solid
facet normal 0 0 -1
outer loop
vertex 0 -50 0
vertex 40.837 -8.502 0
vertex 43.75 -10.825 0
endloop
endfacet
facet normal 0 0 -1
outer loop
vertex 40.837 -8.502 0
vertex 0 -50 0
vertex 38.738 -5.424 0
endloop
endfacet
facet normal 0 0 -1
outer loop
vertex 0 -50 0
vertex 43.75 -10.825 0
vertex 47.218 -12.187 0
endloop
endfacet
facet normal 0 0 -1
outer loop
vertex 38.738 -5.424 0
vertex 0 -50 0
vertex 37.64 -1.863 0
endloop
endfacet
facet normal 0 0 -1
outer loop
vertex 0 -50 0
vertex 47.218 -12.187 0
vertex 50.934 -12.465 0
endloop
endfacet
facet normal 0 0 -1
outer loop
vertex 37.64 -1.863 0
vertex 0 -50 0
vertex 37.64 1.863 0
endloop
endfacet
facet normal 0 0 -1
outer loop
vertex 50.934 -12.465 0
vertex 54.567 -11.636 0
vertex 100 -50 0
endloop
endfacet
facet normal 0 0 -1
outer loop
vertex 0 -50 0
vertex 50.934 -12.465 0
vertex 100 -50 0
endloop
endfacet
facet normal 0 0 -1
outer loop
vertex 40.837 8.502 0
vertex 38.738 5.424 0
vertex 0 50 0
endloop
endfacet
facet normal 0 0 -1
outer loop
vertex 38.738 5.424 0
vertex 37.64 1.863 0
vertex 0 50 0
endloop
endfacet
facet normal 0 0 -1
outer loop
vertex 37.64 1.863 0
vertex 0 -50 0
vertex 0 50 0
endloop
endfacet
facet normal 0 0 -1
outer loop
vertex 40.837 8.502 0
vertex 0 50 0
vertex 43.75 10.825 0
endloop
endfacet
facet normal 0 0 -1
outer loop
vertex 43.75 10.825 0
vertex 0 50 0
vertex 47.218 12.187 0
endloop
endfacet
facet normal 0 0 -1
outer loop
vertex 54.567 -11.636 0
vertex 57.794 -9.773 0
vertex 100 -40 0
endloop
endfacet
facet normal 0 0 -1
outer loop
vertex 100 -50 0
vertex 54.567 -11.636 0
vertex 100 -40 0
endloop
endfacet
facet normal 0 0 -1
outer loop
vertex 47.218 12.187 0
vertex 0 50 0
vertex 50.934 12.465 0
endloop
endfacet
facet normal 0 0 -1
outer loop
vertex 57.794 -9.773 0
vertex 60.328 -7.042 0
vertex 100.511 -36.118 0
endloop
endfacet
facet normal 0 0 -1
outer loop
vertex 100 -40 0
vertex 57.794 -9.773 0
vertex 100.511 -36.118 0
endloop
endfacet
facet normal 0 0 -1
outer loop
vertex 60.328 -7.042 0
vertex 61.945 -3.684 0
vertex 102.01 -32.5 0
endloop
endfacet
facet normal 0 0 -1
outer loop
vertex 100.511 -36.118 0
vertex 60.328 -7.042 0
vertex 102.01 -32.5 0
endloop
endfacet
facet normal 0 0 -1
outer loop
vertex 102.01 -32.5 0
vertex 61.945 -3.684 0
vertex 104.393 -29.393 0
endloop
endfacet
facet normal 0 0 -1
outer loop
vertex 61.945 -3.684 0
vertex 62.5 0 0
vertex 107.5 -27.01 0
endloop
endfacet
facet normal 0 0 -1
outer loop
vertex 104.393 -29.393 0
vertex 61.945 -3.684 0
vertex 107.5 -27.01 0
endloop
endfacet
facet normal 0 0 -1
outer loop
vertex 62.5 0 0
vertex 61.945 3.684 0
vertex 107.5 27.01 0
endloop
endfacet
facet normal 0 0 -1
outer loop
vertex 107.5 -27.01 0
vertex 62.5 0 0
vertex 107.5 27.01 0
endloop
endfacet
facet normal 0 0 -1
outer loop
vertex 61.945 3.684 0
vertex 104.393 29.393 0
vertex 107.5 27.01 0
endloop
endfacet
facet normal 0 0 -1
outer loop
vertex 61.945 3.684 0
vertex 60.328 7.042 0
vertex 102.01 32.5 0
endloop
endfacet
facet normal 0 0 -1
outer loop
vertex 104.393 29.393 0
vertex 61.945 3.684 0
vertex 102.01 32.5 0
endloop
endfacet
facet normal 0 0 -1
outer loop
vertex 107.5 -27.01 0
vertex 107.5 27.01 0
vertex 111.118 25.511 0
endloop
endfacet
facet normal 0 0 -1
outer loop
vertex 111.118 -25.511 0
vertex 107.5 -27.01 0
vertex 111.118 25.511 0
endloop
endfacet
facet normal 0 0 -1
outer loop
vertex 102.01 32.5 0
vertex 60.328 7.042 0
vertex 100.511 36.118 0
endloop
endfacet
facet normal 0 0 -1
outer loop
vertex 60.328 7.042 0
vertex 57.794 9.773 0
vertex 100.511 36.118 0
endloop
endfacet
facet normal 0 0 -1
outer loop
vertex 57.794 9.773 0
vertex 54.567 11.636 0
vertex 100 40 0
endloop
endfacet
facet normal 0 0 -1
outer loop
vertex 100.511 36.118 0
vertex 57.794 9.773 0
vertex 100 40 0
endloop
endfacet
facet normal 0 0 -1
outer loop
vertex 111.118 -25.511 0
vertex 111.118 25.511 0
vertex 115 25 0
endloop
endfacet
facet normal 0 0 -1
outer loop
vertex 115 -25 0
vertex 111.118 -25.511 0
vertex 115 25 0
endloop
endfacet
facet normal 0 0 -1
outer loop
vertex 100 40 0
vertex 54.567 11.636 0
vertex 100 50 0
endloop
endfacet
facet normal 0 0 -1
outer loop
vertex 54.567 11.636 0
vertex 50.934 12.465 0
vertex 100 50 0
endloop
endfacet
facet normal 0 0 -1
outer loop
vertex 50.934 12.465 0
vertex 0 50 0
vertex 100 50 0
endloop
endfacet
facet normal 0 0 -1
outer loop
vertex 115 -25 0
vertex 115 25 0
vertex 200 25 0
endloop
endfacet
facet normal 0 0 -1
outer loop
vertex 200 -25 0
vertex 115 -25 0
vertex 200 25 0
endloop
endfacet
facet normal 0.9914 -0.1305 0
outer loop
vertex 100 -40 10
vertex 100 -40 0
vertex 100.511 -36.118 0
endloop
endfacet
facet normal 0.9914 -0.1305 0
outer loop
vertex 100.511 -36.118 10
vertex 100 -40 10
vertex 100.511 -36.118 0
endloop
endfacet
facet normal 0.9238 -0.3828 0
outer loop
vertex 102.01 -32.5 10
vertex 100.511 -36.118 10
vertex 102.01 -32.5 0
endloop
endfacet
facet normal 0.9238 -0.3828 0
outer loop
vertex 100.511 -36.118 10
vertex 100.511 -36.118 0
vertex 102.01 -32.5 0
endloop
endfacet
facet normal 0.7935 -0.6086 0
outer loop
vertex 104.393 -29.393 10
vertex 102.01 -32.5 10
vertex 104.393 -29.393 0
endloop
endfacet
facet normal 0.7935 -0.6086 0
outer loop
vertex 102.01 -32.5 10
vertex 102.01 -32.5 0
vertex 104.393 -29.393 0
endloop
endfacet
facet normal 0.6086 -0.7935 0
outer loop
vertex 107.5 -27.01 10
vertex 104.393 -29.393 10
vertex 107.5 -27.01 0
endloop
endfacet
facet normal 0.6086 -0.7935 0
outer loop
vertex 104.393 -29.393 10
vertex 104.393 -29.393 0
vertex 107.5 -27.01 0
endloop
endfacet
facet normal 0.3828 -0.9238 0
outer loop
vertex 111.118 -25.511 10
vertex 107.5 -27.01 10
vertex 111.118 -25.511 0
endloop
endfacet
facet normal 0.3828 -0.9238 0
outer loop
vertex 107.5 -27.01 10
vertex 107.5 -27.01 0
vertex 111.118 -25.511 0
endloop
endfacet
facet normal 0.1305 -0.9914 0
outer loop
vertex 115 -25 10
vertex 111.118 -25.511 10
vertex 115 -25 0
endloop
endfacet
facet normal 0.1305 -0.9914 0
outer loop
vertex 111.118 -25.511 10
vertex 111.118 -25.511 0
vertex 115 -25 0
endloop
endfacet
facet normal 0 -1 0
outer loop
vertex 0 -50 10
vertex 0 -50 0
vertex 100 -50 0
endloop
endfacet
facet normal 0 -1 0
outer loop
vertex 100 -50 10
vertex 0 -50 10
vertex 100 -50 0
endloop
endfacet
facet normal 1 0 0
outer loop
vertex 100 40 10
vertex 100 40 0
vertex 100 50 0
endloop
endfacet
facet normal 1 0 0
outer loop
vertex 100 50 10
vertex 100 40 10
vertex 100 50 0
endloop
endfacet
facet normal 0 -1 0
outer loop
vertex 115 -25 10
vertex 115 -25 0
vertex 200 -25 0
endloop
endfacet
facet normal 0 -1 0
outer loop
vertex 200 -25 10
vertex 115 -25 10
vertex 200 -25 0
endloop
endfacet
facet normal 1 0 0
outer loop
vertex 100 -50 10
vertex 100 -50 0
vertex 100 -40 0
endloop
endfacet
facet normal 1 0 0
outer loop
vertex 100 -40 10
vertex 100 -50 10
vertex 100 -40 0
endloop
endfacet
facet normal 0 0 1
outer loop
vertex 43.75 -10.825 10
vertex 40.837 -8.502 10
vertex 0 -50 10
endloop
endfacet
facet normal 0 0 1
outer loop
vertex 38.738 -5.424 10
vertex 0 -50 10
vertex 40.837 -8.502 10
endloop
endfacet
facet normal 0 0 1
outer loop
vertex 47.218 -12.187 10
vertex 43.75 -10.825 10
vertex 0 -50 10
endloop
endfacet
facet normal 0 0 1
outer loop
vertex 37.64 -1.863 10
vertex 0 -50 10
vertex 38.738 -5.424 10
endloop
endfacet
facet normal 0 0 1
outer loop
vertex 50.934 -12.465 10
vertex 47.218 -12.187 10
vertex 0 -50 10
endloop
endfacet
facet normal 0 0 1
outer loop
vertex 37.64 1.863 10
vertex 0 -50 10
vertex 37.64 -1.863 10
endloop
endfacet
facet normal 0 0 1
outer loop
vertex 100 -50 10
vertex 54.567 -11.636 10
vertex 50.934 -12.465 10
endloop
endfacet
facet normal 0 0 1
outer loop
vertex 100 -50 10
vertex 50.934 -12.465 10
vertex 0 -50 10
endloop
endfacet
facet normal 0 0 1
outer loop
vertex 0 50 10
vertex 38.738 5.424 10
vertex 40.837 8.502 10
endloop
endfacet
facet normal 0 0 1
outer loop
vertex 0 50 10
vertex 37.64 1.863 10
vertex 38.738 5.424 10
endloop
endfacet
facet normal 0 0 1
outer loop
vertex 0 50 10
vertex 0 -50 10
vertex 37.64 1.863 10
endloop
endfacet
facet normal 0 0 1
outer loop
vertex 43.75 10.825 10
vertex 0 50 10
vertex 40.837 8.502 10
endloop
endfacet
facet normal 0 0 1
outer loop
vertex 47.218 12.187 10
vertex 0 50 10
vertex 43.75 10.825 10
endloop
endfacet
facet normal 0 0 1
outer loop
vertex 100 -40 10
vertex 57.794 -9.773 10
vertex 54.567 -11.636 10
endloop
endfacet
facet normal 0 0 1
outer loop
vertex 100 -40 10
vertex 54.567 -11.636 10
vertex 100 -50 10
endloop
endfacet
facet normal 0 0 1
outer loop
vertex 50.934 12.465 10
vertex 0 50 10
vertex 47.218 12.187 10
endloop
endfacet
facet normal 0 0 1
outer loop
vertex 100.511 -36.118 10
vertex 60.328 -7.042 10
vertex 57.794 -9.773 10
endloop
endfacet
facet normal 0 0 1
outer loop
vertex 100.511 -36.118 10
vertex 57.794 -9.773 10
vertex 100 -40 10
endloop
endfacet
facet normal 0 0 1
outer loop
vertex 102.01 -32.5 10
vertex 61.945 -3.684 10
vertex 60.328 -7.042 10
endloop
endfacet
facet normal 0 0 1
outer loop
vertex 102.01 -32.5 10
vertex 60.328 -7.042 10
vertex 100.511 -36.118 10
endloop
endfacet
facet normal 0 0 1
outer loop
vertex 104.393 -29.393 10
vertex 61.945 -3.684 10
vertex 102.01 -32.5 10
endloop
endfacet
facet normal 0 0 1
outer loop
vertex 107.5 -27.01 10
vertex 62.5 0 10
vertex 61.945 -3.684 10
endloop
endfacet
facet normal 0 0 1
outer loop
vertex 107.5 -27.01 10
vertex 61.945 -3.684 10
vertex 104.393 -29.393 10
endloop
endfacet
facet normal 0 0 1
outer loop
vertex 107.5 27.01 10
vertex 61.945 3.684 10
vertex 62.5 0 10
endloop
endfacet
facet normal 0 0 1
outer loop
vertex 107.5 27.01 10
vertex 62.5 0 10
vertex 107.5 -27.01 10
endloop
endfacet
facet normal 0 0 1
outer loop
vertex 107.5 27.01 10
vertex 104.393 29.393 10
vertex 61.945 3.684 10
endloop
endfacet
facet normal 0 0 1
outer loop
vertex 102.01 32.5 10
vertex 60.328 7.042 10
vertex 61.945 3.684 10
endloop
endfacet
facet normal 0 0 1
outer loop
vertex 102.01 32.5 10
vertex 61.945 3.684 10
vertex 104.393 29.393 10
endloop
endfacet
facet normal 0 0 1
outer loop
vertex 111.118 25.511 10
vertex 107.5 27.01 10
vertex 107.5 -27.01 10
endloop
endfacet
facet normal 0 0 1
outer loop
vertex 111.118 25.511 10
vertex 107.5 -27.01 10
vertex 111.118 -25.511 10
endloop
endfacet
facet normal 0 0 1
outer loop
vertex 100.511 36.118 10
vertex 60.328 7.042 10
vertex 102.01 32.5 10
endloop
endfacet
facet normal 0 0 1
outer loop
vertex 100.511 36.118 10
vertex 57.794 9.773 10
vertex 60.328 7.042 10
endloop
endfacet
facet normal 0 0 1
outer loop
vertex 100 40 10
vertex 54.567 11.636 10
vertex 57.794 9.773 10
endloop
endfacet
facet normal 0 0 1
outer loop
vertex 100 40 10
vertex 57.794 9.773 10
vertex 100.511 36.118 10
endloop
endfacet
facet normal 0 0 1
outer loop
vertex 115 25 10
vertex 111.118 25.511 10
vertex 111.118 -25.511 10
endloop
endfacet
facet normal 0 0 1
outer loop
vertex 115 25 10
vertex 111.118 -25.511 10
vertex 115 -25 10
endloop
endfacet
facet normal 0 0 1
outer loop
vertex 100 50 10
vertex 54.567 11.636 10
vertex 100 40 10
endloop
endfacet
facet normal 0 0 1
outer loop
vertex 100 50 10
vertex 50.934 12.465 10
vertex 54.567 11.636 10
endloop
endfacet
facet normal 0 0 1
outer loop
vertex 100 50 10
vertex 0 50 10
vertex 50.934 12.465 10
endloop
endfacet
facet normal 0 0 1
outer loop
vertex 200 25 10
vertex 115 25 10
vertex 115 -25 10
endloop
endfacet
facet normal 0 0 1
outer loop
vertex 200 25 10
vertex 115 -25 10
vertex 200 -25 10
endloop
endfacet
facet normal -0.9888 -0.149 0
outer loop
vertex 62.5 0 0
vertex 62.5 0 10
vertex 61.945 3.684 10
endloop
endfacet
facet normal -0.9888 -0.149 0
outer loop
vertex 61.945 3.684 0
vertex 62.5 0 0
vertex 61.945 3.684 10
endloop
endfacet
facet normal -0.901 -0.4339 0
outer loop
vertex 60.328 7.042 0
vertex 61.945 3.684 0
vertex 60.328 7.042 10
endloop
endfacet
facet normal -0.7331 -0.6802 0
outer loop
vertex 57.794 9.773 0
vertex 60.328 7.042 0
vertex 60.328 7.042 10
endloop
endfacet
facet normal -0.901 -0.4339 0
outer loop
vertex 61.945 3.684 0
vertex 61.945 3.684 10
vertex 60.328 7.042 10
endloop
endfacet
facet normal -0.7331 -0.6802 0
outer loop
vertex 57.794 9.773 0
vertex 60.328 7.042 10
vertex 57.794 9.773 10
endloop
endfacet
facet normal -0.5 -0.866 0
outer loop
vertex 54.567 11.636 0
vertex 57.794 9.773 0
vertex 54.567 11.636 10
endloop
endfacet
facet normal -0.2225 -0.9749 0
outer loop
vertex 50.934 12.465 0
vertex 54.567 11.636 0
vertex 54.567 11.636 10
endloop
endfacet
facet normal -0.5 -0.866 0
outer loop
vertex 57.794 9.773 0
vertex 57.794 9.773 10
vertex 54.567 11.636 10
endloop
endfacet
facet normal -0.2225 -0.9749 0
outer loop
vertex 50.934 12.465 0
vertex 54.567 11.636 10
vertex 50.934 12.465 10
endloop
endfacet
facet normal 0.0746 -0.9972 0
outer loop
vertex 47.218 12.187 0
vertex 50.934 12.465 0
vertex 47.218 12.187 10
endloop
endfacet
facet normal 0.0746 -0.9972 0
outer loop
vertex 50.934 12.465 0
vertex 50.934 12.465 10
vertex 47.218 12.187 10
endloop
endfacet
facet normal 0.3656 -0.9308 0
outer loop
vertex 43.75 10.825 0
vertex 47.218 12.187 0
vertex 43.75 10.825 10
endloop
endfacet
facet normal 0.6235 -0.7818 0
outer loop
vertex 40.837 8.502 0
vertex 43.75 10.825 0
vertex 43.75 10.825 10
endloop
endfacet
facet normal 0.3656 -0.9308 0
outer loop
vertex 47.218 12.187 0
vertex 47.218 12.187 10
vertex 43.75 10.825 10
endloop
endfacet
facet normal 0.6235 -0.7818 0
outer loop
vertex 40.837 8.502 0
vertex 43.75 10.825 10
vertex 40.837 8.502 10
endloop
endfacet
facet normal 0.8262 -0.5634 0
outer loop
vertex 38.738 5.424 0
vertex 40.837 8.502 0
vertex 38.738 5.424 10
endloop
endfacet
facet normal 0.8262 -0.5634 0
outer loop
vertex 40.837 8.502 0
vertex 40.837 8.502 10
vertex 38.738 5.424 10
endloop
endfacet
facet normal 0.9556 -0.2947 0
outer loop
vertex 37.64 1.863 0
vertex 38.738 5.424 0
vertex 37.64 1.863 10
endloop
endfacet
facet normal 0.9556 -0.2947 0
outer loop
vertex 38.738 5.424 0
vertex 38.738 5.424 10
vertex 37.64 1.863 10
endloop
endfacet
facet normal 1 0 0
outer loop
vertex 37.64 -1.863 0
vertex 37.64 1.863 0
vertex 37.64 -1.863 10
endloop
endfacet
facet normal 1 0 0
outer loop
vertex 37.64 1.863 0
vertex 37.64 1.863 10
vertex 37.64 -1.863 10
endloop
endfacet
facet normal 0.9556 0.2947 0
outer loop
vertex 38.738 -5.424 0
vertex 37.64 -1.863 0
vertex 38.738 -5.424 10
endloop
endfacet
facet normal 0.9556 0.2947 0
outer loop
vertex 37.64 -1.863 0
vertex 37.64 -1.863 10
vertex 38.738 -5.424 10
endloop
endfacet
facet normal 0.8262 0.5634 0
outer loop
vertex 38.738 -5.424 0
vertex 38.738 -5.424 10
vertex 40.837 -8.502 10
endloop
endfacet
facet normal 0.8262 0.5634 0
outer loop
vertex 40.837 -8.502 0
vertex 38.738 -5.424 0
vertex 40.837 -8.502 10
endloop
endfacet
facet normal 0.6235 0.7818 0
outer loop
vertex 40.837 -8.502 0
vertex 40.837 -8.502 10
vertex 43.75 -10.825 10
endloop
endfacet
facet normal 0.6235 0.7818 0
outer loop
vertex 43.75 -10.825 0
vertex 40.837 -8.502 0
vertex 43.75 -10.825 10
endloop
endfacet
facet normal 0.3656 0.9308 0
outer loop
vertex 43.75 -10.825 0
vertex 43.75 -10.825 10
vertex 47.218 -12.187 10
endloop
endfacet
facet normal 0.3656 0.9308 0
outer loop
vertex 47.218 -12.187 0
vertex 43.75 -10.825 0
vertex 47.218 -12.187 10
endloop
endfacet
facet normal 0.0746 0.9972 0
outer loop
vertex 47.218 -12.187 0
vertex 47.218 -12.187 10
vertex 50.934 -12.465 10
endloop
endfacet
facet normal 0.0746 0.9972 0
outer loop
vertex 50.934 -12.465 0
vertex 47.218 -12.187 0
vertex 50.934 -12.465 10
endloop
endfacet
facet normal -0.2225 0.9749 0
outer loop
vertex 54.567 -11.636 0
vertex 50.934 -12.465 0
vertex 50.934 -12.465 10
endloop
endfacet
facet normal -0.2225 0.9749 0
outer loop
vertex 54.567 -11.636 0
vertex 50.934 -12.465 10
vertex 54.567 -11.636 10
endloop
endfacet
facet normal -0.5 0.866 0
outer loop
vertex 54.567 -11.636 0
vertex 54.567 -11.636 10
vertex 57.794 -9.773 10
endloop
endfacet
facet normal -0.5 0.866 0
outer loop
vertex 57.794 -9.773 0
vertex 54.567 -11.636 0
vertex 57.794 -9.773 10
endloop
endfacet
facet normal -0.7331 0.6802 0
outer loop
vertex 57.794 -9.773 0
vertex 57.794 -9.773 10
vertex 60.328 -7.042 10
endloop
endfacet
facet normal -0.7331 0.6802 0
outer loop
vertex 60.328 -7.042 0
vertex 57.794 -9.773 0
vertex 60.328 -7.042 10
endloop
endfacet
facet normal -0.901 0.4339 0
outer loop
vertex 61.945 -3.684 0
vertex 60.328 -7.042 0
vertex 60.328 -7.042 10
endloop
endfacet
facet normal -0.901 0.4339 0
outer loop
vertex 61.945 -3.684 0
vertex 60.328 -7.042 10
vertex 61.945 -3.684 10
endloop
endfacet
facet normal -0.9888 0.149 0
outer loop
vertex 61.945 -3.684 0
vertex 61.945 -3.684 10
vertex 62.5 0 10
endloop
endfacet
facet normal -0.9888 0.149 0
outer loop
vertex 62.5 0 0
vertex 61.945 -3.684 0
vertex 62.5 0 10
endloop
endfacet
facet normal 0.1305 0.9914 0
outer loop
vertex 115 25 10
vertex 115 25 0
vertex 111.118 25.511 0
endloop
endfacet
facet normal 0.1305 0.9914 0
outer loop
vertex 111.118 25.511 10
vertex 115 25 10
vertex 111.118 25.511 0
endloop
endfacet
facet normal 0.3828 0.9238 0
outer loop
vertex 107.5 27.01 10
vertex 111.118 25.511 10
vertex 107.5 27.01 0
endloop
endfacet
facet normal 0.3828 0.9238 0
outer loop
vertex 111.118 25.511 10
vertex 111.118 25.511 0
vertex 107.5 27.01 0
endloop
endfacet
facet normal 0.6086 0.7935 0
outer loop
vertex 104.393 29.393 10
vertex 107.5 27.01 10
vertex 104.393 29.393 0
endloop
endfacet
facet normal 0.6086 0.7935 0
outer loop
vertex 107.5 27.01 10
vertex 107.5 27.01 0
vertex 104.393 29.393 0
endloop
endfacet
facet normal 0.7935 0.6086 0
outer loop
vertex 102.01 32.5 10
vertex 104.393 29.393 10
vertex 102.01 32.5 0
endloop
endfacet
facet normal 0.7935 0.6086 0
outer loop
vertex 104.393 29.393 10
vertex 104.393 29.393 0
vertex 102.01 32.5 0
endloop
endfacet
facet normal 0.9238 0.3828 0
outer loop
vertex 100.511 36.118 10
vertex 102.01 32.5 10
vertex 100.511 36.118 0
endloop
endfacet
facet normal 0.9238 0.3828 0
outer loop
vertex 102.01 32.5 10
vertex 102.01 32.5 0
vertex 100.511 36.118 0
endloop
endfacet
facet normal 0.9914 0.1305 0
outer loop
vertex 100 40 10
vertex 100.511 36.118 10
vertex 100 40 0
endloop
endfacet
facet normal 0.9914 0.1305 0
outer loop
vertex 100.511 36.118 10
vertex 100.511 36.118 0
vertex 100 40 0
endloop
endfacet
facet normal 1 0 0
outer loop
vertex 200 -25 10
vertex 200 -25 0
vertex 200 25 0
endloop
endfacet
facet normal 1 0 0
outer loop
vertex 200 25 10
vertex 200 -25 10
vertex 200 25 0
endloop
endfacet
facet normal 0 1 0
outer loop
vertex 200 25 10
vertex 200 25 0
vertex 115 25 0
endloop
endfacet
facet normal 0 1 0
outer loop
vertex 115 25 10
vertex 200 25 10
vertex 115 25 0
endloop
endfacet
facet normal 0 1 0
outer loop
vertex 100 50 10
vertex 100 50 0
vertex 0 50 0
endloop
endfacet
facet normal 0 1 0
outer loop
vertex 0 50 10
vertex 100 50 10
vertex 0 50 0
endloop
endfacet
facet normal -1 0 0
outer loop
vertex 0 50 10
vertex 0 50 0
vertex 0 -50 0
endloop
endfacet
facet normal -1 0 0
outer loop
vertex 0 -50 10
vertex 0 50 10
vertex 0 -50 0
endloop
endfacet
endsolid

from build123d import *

# Parameters (mm, degrees)
BOSS_EXTRUDE1_DEPTH = 10
SKETCH2_R           = 12.5
CUT_EXTRUDE1_DEPTH  = 11


with BuildPart() as part:
    # Sketch1 → Boss-Extrude1 (new body)
    with BuildSketch(Plane.XY):
        with BuildLine():
            Line((200, -25), (200, 25))
            Line((200, 25), (115, 25))
            ThreePointArc((115, 25), (104.393398282, 29.393398282), (100, 40))
            Line((100, 40), (100, 50))
            Line((100, 50), (0, 50))
            Line((0, 50), (0, -50))
            Line((0, -50), (100, -50))
            Line((100, -50), (100, -40))
            ThreePointArc((100, -40), (104.393398282, -29.393398282), (115, -25))
            Line((115, -25), (200, -25))
        make_face()
    extrude(amount=BOSS_EXTRUDE1_DEPTH)

    # Sketch2 → Cut-Extrude1 (cut, through all)
    with BuildSketch(Plane.XY.offset(10)):
        with Locations((50, 0)):
            Circle(SKETCH2_R)
    extrude(amount=-CUT_EXTRUDE1_DEPTH, mode=Mode.SUBTRACT)


solid = part.part
